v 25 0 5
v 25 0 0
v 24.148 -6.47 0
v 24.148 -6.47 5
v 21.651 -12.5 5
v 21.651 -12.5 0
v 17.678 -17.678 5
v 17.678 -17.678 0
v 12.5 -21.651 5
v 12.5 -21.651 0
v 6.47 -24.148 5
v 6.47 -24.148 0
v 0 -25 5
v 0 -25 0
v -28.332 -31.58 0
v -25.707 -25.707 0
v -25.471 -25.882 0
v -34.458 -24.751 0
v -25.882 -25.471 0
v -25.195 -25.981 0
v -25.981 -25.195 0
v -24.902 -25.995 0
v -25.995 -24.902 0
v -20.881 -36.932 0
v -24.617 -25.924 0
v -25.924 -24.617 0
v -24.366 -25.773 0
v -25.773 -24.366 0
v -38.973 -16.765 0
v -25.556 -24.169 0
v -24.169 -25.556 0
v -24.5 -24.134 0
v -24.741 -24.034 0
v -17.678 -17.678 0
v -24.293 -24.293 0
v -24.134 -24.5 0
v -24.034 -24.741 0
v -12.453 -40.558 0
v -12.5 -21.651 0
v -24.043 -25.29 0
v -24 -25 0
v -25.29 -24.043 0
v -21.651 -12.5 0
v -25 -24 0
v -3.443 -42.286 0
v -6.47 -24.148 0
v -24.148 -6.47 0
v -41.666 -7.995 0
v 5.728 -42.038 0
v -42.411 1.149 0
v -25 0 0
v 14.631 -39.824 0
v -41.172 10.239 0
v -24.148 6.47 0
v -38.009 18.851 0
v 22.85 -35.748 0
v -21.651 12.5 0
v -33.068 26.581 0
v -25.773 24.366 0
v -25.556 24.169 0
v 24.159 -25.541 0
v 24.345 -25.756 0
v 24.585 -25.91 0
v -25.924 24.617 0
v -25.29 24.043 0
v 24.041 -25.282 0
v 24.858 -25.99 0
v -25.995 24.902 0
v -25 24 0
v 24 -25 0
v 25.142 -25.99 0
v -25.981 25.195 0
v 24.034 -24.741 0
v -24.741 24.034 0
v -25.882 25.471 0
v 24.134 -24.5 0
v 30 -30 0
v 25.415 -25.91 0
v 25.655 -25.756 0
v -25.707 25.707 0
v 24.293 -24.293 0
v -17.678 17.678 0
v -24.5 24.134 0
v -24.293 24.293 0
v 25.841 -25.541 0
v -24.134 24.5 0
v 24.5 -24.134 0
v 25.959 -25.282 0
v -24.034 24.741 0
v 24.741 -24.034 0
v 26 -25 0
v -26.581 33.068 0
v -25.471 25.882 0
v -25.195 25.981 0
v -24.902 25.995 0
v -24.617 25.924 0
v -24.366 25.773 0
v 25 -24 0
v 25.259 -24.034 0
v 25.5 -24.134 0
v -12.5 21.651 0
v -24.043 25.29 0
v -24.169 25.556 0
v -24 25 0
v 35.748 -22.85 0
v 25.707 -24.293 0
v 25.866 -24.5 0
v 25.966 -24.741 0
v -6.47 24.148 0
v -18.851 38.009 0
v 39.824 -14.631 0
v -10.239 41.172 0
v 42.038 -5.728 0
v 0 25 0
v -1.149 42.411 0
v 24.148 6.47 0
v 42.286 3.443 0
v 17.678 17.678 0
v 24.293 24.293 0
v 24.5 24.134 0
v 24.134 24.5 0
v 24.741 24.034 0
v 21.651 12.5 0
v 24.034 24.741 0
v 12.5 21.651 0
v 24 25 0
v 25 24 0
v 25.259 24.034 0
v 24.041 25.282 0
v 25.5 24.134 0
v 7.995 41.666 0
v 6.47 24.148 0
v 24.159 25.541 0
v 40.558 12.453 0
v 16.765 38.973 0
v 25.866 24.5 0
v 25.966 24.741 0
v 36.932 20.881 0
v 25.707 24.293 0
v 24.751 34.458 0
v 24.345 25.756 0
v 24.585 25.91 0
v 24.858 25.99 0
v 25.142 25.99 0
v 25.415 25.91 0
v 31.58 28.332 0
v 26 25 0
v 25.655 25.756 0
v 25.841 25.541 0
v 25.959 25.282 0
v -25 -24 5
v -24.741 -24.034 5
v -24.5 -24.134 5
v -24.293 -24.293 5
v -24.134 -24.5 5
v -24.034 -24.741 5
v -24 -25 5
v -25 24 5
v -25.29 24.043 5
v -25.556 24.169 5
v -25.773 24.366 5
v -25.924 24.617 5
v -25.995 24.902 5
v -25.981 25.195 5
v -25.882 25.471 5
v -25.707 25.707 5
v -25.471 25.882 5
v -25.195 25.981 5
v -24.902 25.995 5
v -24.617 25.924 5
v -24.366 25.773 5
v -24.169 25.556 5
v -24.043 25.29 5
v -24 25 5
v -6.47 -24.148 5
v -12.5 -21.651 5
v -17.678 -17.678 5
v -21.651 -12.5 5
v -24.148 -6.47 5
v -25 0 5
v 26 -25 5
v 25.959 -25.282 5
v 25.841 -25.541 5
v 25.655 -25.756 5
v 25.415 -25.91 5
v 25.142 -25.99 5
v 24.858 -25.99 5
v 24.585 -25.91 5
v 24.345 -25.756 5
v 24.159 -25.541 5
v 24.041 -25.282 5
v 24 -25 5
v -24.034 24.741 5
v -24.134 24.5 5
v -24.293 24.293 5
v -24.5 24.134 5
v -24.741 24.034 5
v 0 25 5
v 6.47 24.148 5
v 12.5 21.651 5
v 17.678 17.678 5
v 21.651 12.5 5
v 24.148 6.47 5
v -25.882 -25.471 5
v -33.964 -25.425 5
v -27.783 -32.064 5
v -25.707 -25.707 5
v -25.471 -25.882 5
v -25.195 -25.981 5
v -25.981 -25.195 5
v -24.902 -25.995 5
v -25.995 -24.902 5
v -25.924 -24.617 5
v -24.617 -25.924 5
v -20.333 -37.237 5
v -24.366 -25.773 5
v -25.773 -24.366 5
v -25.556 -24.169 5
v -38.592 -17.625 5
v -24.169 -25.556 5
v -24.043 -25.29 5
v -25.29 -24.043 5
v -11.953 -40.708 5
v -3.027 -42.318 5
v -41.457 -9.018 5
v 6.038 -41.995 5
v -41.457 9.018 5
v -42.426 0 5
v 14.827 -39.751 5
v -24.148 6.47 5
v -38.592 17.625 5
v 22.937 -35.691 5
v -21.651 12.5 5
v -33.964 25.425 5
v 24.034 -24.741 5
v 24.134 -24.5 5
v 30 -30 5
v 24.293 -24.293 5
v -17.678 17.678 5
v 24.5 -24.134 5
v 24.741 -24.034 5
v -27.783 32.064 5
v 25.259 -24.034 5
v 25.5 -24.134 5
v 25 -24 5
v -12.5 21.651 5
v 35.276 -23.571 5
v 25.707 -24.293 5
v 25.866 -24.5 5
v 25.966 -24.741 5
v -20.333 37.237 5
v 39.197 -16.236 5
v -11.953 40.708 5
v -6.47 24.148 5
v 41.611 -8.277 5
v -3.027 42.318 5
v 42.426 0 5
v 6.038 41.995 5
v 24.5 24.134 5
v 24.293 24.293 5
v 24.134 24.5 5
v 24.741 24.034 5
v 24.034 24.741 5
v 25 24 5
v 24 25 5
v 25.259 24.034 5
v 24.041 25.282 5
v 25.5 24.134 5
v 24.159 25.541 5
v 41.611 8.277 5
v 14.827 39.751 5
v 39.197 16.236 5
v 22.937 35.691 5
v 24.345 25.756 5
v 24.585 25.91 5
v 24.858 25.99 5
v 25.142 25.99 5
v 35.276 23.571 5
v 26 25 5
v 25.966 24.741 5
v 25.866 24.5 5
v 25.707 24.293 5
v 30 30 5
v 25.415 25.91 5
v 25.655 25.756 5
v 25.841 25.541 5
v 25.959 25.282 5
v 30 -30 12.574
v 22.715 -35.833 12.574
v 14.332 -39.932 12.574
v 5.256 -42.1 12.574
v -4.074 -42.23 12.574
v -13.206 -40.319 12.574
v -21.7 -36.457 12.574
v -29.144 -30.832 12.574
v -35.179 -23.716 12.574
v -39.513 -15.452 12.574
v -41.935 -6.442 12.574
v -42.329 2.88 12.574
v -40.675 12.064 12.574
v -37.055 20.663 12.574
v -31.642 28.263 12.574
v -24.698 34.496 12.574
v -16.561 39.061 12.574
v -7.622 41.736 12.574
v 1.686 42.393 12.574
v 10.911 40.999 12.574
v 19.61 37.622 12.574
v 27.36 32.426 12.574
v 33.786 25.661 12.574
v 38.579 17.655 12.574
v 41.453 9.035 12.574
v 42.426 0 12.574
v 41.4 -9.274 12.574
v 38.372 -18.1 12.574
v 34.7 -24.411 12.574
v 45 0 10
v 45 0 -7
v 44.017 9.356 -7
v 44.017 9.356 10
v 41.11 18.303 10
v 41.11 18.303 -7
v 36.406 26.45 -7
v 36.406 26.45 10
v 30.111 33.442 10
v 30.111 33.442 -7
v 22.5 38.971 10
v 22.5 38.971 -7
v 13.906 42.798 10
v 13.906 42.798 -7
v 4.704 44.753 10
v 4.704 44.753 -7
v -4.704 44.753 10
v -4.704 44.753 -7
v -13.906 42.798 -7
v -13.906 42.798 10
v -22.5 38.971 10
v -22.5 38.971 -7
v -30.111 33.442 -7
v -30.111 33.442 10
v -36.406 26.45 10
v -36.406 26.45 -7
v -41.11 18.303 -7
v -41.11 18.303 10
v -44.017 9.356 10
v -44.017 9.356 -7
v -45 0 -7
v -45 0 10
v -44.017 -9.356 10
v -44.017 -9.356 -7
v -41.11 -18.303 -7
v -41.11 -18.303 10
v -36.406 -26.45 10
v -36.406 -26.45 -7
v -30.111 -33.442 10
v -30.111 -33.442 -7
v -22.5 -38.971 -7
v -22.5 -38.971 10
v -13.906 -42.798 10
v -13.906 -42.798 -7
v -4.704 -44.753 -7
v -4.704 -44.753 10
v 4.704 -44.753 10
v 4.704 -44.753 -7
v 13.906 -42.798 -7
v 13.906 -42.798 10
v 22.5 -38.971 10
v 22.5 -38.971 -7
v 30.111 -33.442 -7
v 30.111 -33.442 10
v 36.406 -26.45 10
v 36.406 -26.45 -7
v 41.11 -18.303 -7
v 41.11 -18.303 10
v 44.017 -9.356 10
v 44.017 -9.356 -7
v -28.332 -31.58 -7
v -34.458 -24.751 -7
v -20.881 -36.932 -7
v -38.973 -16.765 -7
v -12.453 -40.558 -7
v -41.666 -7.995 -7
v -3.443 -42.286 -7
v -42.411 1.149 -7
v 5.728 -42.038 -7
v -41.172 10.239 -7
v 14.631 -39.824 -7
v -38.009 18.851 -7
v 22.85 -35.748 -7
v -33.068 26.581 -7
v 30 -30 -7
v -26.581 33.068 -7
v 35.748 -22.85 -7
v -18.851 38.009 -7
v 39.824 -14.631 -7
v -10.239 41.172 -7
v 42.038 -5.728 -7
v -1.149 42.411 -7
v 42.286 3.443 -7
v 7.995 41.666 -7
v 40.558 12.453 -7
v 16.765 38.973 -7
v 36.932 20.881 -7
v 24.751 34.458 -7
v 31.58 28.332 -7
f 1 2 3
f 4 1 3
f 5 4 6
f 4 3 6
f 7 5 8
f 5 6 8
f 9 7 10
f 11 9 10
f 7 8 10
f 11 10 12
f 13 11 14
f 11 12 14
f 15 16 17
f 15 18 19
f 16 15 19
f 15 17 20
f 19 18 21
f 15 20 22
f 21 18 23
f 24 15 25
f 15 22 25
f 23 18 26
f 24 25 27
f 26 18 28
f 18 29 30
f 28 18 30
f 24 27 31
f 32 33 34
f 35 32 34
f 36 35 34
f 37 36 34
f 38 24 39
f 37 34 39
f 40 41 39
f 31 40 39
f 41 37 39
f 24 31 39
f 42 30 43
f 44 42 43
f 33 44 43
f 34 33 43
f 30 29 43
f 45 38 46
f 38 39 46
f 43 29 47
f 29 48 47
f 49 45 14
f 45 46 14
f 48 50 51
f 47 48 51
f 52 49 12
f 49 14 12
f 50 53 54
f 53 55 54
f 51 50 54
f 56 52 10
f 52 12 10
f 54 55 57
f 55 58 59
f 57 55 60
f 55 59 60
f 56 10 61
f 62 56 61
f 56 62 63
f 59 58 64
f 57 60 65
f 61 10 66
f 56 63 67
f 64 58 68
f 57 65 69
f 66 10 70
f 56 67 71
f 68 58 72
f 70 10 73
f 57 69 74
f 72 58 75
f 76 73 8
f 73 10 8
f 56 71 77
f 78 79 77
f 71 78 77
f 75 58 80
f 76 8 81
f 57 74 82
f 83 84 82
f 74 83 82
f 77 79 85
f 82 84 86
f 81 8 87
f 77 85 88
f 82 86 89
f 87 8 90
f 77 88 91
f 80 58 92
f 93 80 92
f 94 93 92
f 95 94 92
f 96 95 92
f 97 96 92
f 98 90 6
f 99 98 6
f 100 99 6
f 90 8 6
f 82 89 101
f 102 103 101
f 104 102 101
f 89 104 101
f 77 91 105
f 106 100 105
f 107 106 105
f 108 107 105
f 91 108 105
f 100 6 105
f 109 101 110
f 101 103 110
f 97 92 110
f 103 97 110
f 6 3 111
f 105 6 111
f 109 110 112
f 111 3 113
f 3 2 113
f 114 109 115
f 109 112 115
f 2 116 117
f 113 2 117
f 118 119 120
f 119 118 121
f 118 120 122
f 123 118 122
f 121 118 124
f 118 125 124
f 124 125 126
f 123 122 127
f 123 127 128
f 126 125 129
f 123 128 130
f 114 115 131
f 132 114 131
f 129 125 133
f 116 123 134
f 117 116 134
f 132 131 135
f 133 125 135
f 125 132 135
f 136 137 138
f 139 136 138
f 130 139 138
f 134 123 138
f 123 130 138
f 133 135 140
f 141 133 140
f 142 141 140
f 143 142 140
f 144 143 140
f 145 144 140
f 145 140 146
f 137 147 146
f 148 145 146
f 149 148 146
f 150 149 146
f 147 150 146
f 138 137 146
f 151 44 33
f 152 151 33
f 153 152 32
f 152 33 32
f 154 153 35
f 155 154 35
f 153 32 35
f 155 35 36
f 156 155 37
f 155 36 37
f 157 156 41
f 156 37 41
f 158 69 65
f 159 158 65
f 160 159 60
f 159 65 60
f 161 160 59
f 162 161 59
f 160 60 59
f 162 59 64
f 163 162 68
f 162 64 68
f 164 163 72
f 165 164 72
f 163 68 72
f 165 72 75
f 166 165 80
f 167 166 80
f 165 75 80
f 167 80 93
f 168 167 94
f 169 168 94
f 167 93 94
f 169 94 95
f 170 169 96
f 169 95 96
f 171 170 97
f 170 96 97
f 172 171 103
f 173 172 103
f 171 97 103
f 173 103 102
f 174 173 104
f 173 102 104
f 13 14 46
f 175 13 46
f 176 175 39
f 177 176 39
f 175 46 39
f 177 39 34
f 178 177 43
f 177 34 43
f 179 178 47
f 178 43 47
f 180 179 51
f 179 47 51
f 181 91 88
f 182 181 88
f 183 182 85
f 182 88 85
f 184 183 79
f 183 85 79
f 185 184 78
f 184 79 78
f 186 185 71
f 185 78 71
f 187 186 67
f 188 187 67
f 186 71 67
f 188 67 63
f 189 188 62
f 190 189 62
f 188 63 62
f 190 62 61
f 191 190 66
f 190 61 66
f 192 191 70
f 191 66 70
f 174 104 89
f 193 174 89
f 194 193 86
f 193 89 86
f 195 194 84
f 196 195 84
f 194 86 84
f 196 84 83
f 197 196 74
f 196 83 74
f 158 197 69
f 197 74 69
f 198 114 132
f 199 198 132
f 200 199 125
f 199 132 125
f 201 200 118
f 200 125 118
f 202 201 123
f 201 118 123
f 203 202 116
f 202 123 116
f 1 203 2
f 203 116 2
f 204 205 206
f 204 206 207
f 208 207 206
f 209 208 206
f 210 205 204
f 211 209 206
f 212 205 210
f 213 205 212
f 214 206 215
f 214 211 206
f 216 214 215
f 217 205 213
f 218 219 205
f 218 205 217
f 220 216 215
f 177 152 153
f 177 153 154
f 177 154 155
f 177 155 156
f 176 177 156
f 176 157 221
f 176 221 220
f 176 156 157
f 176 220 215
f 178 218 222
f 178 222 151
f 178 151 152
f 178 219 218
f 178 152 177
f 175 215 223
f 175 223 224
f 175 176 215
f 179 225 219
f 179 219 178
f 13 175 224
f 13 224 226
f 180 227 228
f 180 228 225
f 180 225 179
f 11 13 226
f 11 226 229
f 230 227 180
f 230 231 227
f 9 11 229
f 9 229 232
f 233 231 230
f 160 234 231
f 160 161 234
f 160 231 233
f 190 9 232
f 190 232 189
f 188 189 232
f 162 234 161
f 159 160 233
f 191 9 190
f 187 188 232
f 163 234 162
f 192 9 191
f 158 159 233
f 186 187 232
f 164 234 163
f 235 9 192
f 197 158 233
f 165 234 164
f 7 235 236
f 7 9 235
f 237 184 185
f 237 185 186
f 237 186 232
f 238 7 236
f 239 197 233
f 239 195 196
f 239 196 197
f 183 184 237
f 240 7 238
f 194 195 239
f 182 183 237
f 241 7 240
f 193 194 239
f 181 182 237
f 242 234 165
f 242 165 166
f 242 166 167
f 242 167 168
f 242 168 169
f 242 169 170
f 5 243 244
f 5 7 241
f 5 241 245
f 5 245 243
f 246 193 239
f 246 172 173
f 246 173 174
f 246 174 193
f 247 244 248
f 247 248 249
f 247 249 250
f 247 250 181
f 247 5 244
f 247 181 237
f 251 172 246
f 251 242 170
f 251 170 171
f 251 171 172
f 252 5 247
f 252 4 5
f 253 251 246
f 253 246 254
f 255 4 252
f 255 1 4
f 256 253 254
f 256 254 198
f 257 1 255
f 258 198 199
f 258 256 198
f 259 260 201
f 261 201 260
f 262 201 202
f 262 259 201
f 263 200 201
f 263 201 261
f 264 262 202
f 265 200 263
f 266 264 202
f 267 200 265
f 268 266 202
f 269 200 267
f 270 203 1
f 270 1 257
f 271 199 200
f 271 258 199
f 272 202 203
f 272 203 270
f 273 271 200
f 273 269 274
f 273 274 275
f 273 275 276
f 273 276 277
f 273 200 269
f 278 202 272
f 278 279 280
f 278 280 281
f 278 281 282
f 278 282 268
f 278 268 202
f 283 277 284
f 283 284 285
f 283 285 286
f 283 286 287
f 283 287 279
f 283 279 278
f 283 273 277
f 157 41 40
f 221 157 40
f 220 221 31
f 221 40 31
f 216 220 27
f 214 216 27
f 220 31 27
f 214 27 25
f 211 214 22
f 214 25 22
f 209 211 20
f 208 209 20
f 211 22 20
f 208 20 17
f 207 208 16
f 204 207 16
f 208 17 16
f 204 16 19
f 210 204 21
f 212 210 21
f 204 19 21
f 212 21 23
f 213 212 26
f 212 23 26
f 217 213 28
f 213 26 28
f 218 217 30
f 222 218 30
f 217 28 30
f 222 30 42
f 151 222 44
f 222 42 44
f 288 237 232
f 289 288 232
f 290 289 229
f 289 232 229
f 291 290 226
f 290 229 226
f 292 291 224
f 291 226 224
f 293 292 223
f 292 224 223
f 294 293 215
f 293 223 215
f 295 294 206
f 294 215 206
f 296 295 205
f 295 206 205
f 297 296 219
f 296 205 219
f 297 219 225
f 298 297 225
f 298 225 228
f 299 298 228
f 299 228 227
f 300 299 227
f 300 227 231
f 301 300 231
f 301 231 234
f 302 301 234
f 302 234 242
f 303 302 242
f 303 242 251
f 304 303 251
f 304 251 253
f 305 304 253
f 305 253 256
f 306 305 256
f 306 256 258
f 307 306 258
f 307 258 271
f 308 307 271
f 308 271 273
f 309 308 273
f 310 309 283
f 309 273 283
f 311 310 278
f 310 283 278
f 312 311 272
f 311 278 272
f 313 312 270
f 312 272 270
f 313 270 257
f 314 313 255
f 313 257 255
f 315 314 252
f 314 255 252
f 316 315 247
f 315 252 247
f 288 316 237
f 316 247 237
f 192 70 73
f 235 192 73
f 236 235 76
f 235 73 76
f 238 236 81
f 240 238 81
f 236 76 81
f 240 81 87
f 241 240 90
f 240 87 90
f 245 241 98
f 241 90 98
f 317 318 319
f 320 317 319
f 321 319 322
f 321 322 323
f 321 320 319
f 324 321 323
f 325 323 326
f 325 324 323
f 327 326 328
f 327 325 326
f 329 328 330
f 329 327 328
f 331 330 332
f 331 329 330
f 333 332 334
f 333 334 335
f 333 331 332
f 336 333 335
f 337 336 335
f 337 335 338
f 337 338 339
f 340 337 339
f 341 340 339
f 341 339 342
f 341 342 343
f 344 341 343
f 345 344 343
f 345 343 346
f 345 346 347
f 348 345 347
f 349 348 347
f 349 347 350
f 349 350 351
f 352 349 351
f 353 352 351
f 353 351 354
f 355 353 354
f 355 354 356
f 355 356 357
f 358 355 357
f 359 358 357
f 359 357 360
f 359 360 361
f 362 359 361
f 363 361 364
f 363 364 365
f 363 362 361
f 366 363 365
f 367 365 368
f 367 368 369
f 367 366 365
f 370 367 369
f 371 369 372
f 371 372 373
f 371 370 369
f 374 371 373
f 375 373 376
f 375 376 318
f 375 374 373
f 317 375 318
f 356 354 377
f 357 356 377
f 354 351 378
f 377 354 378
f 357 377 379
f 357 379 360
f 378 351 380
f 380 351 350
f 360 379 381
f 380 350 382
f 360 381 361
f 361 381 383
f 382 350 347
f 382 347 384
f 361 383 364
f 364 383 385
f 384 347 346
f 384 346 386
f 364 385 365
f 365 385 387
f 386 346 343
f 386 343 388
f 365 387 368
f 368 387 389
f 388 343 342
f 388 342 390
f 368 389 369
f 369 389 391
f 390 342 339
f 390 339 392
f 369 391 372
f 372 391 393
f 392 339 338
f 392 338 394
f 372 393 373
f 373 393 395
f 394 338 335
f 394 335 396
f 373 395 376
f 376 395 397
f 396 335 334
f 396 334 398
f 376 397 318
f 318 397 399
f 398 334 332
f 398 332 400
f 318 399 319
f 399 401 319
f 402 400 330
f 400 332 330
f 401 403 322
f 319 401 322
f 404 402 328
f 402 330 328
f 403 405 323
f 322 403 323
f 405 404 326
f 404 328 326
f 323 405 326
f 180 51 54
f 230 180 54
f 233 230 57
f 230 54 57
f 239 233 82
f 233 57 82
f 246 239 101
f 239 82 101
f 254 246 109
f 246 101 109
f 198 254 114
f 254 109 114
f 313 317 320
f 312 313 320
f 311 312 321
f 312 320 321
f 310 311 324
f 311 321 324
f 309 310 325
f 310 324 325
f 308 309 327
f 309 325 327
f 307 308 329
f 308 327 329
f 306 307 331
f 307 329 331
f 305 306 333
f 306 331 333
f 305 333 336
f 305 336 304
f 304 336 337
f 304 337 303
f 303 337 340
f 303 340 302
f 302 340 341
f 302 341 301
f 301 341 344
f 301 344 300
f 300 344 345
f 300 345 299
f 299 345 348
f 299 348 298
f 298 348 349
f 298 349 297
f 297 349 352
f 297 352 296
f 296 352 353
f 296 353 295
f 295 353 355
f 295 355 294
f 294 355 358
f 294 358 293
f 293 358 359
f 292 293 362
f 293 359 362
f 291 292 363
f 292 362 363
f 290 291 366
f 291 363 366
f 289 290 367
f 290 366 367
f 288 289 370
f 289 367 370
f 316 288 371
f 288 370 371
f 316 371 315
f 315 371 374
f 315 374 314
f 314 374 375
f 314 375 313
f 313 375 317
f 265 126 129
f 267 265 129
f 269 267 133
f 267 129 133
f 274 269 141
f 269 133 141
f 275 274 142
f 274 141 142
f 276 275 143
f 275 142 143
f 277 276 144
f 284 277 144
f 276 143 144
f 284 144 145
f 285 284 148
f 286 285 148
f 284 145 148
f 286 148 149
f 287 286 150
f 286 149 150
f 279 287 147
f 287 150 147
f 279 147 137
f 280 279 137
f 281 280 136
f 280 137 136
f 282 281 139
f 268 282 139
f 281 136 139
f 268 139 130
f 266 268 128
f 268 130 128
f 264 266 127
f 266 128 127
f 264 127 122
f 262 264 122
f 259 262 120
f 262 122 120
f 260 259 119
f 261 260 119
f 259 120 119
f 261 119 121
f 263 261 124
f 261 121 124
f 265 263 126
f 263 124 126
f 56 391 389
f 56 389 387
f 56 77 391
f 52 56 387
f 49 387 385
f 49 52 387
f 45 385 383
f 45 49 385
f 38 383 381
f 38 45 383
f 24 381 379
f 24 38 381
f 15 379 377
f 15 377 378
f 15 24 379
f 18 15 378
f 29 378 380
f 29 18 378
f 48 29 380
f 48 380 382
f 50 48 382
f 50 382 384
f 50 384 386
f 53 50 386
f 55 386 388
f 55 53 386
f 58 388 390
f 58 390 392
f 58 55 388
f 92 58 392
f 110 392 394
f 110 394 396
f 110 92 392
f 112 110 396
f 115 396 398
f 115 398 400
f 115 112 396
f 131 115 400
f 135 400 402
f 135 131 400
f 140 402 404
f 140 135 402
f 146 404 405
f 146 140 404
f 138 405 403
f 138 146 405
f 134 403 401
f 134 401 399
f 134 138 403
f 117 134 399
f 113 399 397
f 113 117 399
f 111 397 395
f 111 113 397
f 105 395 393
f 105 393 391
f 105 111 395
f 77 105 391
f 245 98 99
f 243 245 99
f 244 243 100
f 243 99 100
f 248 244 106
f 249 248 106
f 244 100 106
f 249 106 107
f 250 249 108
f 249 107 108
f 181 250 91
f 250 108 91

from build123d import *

# Parameters (mm, degrees)
F0_W     = 60
F0_H     = 60
F1_DEPTH = 5
F0_R     = 45
F2_DEPTH = 15
F4_DEPTH = 4
F5_DEPTH = 7


# Not quite as in the source:
# - a fillet or chamfer that OpenCascade refuses, or shapes differently, is made with other operations: its cross-section is extruded or revolved along the edge and cut away or added


with BuildPart() as f1:
    # F0 (on Top) → F1 (new body)
    with BuildSketch(Plane.XY):
        Rectangle(F0_W, F0_H)
        with BuildLine():
            Line((25, 24), (25, 0))
            Line((25, 0), (25, -24))
            ThreePointArc((25, -24), (25.7071067812, -24.2928932188), (26, -25))
            ThreePointArc((26, -25), (25, -26), (24, -25))
            Line((24, -25), (-5.83e-08, -25))
            Line((-5.83e-08, -25), (-24, -25))
            ThreePointArc((-24, -25), (-25.7071067812, -25.7071067812), (-25, -24))
            Line((-25, -24), (-25, 2.61e-08))
            Line((-25, 2.61e-08), (-25, 24))
            ThreePointArc((-25, 24), (-25.7071067812, 25.7071067812), (-24, 25))
            Line((-24, 25), (0, 25))
            Line((0, 25), (24, 25))
            ThreePointArc((24, 25), (25, 26), (26, 25))
            ThreePointArc((26, 25), (25.7071067812, 24.2928932188), (25, 24))
        make_face(mode=Mode.SUBTRACT)
        with BuildLine():
            ThreePointArc((0, 25), (17.6776695297, 17.6776695297), (25, 0))
            Line((25, 0), (25, 24))
            ThreePointArc((25, 24), (24.2928932188, 24.2928932188), (24, 25))
            Line((24, 25), (0, 25))
        make_face()
        with BuildLine():
            Line((30, 30), (30, -30))
            ThreePointArc((30, -30), (39.1968889463, -16.2358830044), (42.4264068712, 0))
            ThreePointArc((42.4264068712, 0), (39.1968889463, 16.2358830044), (30, 30))
        make_face()
        with BuildLine():
            ThreePointArc((-30, -30), (0, -42.4264068712), (30, -30))
            Line((30, -30), (-30, -30))
        make_face()
        with BuildLine():
            ThreePointArc((-30, 30), (-42.4264068712, 0), (-30, -30))
            Line((-30, -30), (-30, 30))
        make_face()
        with BuildLine():
            Line((-24, -25), (-5.83e-08, -25))
            ThreePointArc((-5.83e-08, -25), (-17.6776695595, -17.6776694998), (-25, 2.61e-08))
            Line((-25, 2.61e-08), (-25, -24))
            ThreePointArc((-25, -24), (-24.2928932188, -24.2928932188), (-24, -25))
        make_face()
        with BuildLine():
            Line((25, -24), (25, 0))
            ThreePointArc((25, 0), (17.677669509, -17.6776695503), (-5.83e-08, -25))
            Line((-5.83e-08, -25), (24, -25))
            ThreePointArc((24, -25), (24.2928932188, -24.2928932188), (25, -24))
        make_face()
        with BuildLine():
            ThreePointArc((-25, 2.61e-08), (-17.6776695204, 17.6776695389), (0, 25))
            Line((0, 25), (-24, 25))
            ThreePointArc((-24, 25), (-24.2928932188, 24.2928932188), (-25, 24))
            Line((-25, 24), (-25, 2.61e-08))
        make_face()
        with BuildLine():
            Line((-30, 30), (30, 30))
            ThreePointArc((30, 30), (0, 42.4264068712), (-30, 30))
        make_face()
    extrude(amount=F1_DEPTH)

    # F0 (on Top) → F2 (join)
    with BuildSketch(Plane.XY):
        Circle(F0_R)
        with BuildLine():
            ThreePointArc((42.4264068712, 0), (39.1968889463, -16.2358830044), (30, -30))
            ThreePointArc((30, -30), (0, -42.4264068712), (-30, -30))
            ThreePointArc((-30, -30), (-42.4264068712, 0), (-30, 30))
            ThreePointArc((-30, 30), (0, 42.4264068712), (30, 30))
            ThreePointArc((30, 30), (39.1968889463, 16.2358830044), (42.4264068712, 0))
        make_face(mode=Mode.SUBTRACT)
    extrude(amount=F2_DEPTH)

    # F3: chamfer of 5 on 1 edges, made by hand

    # F3_s1 → F3_t2 (revolve, cut)
    with BuildSketch(Plane.XZ):
        Polygon((40, 15), (45, 10), (45, 15), align=None)
    revolve(axis=Axis((0, 0, 15), (0, 0, 1)), mode=Mode.SUBTRACT)

    # F0 (on Top) → F4 (join)
    with BuildSketch(Plane.XY):
        Circle(F0_R)
        with BuildLine():
            ThreePointArc((42.4264068712, 0), (39.1968889463, -16.2358830044), (30, -30))
            ThreePointArc((30, -30), (0, -42.4264068712), (-30, -30))
            ThreePointArc((-30, -30), (-42.4264068712, 0), (-30, 30))
            ThreePointArc((-30, 30), (0, 42.4264068712), (30, 30))
            ThreePointArc((30, 30), (39.1968889463, 16.2358830044), (42.4264068712, 0))
        make_face(mode=Mode.SUBTRACT)
    extrude(amount=-F4_DEPTH)

    # F0 (on Top) → F5 (join)
    with BuildSketch(Plane.XY):
        Circle(F0_R)
        with BuildLine():
            ThreePointArc((42.4264068712, 0), (39.1968889463, -16.2358830044), (30, -30))
            ThreePointArc((30, -30), (0, -42.4264068712), (-30, -30))
            ThreePointArc((-30, -30), (-42.4264068712, 0), (-30, 30))
            ThreePointArc((-30, 30), (0, 42.4264068712), (30, 30))
            ThreePointArc((30, 30), (39.1968889463, 16.2358830044), (42.4264068712, 0))
        make_face(mode=Mode.SUBTRACT)
    extrude(amount=-F5_DEPTH)


solid = f1.part
